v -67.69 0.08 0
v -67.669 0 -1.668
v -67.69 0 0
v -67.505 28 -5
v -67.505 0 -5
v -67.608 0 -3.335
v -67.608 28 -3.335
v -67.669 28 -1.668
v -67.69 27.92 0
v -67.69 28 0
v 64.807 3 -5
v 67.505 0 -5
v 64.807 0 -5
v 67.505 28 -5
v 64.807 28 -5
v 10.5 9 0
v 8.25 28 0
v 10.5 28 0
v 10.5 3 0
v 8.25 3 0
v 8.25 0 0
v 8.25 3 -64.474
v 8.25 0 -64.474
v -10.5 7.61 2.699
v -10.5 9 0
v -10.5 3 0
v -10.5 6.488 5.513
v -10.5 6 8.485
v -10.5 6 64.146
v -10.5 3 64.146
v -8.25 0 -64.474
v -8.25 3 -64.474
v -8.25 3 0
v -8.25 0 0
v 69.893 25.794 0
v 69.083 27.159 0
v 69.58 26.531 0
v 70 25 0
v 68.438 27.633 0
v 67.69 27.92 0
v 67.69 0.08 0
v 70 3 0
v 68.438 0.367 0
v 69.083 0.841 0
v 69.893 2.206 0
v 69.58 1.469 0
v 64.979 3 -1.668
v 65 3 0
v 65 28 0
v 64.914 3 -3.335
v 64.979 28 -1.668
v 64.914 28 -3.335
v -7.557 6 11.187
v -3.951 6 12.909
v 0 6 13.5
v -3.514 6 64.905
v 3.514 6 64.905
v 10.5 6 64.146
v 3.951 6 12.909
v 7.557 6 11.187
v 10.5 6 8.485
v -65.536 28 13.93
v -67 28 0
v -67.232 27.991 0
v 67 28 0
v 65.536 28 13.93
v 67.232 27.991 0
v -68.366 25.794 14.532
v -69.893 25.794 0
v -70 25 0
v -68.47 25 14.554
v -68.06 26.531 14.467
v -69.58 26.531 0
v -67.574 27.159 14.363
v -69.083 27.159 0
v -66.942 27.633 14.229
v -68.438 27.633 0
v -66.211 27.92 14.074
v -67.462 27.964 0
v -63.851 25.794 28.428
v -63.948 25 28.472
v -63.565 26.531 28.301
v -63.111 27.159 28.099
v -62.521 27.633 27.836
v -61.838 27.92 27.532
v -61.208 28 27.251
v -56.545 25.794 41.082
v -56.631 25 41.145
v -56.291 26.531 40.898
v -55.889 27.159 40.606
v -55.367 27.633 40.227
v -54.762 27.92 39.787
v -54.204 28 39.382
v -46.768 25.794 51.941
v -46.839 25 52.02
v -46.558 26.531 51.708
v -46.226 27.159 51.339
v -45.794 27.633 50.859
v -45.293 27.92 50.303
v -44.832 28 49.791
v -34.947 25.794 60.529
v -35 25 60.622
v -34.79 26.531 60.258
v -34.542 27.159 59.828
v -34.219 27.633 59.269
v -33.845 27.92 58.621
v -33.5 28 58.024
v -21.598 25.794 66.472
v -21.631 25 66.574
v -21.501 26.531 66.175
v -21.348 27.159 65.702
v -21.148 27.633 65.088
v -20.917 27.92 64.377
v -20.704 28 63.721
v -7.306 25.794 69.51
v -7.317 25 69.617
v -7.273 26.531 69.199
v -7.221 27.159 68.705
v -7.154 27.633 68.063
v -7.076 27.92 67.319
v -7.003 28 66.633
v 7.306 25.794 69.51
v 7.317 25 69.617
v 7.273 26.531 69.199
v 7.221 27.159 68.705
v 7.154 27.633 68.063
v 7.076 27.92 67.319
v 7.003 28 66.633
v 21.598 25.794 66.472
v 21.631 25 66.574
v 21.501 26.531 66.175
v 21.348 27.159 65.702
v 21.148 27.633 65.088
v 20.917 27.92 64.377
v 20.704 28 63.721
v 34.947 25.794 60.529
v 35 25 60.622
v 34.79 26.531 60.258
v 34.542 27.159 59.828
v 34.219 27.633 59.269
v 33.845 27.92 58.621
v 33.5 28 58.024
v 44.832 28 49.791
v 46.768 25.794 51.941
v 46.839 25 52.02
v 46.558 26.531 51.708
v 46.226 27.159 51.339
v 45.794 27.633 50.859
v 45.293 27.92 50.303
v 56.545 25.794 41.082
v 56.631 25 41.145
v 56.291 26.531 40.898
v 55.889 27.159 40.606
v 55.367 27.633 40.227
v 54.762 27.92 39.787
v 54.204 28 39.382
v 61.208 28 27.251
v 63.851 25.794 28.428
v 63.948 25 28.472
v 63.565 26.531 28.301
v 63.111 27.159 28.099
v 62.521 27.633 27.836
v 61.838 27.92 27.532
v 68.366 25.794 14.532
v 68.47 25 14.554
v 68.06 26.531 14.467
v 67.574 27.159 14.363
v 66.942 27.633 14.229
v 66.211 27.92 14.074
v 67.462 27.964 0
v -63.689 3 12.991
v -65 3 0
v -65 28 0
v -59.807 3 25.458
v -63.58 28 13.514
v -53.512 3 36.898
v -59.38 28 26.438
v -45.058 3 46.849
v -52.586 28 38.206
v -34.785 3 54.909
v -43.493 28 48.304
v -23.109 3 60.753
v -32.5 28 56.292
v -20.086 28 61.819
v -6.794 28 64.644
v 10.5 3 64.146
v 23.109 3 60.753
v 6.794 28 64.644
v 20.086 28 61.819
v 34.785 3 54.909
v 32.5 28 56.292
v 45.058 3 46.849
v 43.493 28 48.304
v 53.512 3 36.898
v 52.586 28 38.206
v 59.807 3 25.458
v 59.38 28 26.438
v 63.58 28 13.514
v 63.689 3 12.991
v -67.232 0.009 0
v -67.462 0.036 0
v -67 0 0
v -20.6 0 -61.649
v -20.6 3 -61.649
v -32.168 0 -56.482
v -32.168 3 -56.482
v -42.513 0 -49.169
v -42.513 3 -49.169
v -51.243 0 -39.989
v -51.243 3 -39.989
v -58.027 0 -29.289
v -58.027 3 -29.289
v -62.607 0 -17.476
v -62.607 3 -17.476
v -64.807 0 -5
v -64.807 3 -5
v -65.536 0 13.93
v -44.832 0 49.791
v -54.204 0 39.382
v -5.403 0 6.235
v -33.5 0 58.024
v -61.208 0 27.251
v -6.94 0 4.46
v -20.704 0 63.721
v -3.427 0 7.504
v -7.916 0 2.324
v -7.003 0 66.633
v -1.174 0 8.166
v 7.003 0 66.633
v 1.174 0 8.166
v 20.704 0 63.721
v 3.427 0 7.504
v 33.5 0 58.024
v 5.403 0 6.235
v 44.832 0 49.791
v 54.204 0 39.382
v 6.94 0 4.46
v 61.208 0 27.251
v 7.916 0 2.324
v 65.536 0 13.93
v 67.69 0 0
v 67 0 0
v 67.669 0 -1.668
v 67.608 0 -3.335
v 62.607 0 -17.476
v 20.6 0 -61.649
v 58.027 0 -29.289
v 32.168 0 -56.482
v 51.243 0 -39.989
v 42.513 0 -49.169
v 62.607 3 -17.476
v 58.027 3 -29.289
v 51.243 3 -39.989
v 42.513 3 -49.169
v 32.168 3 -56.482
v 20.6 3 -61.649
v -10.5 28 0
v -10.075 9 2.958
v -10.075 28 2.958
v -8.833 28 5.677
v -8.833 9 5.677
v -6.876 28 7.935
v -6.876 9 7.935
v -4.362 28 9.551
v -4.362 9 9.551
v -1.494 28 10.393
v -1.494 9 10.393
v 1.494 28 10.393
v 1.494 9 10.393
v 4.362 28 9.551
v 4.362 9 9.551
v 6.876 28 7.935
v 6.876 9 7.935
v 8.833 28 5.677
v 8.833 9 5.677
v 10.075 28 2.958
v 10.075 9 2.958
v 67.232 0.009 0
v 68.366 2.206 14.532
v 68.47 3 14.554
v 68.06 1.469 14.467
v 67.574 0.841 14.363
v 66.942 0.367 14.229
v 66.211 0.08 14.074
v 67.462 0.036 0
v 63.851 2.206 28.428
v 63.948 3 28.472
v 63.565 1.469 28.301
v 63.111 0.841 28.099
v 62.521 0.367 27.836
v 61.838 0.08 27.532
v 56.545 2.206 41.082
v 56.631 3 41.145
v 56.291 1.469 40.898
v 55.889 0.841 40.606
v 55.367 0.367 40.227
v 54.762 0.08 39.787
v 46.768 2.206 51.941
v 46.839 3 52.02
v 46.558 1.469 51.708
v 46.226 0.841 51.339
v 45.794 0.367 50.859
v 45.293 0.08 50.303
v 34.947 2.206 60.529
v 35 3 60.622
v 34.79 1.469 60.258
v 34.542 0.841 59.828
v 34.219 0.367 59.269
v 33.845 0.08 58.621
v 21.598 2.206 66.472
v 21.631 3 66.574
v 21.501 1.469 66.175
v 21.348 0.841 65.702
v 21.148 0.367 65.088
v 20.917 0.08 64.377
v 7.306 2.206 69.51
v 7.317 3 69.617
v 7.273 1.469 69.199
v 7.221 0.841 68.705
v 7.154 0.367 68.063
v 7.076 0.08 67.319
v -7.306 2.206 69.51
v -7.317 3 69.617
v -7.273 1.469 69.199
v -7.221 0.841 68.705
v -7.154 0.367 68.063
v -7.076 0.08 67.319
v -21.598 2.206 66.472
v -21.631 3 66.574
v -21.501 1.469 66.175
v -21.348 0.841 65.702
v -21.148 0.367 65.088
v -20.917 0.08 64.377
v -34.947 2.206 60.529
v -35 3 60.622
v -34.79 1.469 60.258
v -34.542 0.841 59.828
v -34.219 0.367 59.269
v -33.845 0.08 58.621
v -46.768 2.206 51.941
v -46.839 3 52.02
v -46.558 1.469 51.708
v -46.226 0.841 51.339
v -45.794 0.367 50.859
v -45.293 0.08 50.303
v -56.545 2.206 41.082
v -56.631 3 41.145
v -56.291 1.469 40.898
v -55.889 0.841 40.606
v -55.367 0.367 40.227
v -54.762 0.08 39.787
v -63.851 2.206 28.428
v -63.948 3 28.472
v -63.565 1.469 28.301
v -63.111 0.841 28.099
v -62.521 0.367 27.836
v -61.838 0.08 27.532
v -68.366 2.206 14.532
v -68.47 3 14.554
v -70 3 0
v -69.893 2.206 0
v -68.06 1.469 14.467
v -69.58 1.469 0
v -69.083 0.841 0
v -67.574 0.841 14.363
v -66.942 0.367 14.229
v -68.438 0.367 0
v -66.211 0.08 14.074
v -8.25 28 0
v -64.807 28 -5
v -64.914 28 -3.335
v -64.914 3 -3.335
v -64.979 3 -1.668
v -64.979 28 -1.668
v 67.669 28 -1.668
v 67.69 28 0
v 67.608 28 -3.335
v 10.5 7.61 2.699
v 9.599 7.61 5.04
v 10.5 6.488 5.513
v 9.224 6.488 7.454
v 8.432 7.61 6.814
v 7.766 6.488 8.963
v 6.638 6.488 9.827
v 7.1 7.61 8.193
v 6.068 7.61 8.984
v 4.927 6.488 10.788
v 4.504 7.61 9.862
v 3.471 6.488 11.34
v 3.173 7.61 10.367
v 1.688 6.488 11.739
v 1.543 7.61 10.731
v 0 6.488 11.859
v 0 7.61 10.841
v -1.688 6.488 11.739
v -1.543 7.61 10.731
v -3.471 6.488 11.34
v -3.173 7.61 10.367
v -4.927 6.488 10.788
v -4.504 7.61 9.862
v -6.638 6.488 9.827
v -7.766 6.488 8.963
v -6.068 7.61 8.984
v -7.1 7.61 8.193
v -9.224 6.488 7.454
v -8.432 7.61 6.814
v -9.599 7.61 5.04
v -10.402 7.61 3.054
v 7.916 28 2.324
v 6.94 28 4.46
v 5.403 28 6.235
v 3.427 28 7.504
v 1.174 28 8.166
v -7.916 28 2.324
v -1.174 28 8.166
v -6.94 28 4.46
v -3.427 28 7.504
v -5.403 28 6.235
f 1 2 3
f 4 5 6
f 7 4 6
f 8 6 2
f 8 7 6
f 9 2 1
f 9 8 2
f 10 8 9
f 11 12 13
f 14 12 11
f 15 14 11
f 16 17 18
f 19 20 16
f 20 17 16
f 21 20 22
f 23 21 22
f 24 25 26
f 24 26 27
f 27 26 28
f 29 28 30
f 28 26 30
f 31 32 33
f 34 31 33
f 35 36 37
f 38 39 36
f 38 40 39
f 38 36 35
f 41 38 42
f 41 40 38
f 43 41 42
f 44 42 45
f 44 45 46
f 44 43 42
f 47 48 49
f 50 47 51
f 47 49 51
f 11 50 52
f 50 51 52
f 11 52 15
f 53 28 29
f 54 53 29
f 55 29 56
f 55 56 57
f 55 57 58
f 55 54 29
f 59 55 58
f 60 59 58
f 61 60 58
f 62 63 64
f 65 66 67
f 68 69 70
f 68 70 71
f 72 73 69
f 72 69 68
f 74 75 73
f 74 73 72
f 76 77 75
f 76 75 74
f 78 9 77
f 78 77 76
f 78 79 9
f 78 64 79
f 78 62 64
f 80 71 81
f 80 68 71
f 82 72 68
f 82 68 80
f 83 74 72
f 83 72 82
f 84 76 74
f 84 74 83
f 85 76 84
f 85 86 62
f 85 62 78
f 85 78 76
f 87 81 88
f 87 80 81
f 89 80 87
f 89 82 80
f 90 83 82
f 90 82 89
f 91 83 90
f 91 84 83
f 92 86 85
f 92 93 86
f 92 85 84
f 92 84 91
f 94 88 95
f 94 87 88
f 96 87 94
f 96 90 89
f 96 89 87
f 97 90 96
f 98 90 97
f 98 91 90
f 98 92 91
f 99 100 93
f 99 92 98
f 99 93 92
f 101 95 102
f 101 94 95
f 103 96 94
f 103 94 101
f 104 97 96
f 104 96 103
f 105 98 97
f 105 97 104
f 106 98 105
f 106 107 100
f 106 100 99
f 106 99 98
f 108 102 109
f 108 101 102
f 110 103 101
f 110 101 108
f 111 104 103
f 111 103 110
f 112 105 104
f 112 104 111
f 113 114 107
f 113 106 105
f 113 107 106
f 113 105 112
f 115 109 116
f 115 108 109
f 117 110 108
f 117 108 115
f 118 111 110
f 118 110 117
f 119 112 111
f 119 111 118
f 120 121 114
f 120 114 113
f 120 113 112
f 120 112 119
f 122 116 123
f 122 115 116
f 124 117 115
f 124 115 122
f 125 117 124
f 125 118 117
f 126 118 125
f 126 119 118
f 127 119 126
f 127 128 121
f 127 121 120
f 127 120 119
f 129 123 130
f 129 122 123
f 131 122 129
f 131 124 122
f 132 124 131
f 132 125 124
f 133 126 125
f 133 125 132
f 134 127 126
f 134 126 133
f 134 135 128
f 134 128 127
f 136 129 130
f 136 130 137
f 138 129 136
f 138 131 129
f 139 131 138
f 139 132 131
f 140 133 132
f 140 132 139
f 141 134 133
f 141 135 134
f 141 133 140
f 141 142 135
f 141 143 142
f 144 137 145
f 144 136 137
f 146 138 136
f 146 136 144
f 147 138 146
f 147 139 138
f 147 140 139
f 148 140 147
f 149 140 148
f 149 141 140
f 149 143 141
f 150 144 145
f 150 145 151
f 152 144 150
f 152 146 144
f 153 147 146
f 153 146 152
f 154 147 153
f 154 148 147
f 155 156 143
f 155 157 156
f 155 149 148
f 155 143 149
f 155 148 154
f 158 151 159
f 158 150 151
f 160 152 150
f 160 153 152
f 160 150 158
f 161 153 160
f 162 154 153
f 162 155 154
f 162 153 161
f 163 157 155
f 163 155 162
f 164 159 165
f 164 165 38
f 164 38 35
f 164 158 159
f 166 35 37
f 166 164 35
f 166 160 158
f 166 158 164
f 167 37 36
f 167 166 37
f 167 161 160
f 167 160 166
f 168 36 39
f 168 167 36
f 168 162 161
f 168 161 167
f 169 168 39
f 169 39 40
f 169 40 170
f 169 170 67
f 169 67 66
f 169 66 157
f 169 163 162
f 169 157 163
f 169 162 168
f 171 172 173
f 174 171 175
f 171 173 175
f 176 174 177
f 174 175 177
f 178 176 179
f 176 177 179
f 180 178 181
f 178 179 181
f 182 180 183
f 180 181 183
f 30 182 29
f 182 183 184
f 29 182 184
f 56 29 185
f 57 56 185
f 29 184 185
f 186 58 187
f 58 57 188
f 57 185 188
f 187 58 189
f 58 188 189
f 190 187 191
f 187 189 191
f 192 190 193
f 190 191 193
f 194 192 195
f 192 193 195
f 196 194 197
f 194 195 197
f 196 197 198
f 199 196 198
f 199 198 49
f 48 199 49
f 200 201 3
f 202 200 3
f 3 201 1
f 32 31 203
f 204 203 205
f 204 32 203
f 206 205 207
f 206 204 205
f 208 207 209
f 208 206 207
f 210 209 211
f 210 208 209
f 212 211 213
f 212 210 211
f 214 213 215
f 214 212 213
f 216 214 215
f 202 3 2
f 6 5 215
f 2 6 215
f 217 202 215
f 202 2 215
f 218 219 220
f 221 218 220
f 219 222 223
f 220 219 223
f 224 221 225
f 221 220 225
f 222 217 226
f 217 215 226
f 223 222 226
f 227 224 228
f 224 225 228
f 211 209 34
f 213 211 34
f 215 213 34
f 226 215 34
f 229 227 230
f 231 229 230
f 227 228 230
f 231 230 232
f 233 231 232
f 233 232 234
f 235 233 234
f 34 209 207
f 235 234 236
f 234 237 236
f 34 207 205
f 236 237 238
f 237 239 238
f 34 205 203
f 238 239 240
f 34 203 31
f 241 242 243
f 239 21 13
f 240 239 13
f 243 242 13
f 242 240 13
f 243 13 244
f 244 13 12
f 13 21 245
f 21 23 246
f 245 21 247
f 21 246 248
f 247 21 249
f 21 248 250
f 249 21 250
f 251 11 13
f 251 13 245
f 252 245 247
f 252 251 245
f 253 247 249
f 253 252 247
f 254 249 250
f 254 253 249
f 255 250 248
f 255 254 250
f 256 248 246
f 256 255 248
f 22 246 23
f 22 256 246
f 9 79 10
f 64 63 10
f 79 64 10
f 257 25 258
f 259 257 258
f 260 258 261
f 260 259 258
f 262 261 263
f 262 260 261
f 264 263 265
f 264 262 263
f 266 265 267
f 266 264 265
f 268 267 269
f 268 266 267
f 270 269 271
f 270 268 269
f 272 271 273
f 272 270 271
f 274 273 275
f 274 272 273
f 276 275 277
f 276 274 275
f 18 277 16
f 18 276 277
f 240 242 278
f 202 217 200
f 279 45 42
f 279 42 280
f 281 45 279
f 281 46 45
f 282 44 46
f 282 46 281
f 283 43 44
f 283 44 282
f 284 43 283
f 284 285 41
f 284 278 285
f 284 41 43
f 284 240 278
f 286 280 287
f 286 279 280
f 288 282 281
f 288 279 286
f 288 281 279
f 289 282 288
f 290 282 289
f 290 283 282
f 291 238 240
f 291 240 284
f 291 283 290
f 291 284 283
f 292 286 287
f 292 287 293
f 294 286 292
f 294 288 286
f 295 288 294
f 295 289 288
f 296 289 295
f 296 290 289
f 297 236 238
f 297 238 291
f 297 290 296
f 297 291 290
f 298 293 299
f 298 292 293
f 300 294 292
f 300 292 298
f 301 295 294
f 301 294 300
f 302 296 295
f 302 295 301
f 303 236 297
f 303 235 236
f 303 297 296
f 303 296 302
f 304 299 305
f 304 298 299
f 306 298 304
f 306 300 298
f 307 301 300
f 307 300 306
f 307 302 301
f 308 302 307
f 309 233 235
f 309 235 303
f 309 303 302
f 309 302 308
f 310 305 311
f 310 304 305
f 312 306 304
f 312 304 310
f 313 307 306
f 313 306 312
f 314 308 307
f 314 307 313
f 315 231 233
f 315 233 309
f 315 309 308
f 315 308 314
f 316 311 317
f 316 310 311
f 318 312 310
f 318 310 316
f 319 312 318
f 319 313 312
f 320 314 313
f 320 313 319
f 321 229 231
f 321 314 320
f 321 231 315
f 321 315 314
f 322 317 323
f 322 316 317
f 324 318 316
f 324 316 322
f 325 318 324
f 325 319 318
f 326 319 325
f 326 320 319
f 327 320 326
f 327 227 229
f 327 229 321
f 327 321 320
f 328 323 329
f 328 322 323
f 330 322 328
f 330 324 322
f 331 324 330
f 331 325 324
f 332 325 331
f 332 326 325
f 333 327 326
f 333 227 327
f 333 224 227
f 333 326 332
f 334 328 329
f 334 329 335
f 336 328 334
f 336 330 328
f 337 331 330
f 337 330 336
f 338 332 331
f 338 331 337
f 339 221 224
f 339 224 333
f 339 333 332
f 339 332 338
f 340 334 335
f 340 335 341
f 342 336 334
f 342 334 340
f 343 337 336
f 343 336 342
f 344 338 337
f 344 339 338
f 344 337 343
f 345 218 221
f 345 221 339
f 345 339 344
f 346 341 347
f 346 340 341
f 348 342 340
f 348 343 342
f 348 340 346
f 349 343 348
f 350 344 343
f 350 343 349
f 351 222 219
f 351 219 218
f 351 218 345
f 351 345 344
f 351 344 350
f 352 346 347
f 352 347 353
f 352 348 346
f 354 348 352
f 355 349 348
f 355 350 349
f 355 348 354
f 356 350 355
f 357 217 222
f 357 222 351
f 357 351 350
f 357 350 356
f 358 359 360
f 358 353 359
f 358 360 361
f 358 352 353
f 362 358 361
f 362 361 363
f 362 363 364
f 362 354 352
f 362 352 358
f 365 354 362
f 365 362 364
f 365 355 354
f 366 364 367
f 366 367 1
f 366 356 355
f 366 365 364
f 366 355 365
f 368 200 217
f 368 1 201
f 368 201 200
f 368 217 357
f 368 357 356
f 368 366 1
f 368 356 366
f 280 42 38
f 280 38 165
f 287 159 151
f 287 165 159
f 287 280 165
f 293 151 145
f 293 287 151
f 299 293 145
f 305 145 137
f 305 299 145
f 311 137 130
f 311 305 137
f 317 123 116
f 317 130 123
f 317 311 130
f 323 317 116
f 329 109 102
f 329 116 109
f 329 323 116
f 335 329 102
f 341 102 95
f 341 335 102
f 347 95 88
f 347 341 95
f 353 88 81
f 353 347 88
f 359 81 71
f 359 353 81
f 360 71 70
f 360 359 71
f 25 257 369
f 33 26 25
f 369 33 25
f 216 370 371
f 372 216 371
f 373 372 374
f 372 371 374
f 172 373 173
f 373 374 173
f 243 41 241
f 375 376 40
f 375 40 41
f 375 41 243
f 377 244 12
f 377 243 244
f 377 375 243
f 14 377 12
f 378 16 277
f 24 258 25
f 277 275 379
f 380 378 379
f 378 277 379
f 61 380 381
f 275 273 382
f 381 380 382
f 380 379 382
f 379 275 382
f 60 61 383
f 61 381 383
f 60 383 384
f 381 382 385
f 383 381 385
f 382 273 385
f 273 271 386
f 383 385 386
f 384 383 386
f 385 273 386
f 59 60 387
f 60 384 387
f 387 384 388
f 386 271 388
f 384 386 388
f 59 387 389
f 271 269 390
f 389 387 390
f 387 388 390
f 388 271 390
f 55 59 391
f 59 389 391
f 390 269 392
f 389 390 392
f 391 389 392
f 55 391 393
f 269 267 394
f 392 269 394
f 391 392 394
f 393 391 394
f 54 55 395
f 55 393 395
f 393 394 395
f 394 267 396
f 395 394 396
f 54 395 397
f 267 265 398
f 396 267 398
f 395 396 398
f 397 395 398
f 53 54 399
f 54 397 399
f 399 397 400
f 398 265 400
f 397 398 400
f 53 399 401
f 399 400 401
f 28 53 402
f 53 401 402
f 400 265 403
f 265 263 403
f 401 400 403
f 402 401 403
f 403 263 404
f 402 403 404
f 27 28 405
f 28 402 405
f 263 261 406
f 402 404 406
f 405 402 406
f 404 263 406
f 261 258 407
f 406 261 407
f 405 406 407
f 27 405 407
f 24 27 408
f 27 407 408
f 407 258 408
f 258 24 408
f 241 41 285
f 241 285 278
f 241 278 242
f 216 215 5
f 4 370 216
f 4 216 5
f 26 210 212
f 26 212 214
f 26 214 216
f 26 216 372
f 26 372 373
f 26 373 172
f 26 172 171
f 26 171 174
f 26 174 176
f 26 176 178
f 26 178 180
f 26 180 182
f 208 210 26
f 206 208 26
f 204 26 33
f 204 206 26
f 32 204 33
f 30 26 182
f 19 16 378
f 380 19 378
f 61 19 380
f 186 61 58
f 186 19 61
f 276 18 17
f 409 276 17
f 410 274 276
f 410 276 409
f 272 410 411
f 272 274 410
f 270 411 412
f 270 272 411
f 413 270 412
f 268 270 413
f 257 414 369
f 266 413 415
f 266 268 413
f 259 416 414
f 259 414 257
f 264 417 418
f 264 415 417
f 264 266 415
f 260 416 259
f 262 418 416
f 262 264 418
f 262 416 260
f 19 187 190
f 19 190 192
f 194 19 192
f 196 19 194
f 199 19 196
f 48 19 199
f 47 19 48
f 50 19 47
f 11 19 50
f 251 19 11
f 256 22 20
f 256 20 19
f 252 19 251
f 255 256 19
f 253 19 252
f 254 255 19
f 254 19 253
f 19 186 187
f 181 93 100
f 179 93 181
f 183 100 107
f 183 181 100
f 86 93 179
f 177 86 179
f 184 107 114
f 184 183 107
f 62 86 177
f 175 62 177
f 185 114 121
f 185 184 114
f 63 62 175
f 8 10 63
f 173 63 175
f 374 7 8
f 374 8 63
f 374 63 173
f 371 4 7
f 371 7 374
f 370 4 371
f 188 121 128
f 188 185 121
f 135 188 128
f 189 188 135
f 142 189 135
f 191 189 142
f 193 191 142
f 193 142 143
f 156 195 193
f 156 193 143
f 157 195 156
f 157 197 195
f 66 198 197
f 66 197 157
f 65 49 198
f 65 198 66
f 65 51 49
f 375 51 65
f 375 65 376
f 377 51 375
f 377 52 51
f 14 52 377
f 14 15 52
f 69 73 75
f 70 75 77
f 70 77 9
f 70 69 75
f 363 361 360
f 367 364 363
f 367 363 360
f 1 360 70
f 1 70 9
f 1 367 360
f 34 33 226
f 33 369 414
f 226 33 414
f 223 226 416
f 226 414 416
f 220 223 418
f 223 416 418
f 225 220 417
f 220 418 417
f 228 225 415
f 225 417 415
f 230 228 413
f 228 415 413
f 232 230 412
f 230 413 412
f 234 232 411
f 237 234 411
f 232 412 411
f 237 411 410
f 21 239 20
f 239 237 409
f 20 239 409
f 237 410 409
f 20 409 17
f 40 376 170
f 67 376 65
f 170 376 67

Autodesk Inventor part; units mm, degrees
ref_plane "YZ Plane" through (0, 0, 0) normal (1, 0, 0) x (0, 1, 0)
ref_plane "XZ Plane" through (0, 0, 0) normal (0, 1, 0) x (-1, 0, 0)
ref_plane "XY Plane" through (0, 0, 0) normal (0, 0, 1) x (1, 0, 0)
sketch "Sketch1" plane through (0, 0, 0) normal (0, 1, 0) x (-1, 0, 0)
  circle A0 centre (0, 0) radius 70
  dimension "d0" = 140
extrude "Extrusion1" add sketch "Sketch1" along normal blind 28
sketch "Sketch2" plane through (0, 28, 0) normal (0, 1, 0) x (1, 0, 0)
  circle A0 centre (0, 0) radius 8.25
  dimension "d3" = 16.5
extrude "Extrusion2" cut sketch "Sketch2" against normal blind 28
sketch "Sketch3" plane through (0, 28, 0) normal (0, 1, 0) x (1, 0, 0)
  circle A0 centre (0, 0) radius 8.25
  circle A1 centre (0, 0) radius 65
  circle A2 centre (0, 0) radius 10.5
  dimension "d6" = 130
  dimension "d7" = 21
extrude "Extrusion3" cut sketch "Sketch3" against normal blind 25 contours A1
sketch "Sketch4" plane through (0, 3, 0) normal (0, 1, 0) x (1, 0, 0)
  line L0 (-77.4845, 0) -> (88.5537, 0)
  line L1 (88.5537, 0) -> (88.5537, 100.8261)
  line L2 (88.5537, 100.8261) -> (-77.4845, 100.8261)
  line L3 (-77.4845, 100.8261) -> (-77.4845, 0)
  point P0 (0, 0)
  point P1 (0, 0)
extrude "Extrusion4" cut sketch "Sketch4" along normal blind 220
sketch "Sketch5" plane through (0, 3, 0) normal (0, 1, 0) x (1, 0, 0)
  arc A0 (-10.5, 0) -> (10.5, 0) centre (0, 0) ccw projected
  arc A1 (-65, 0) -> (65, 0) centre (0, 0) ccw projected
  arc A2 (-10.5, 0) -> (10.5, 0) centre (0, 0) ccw projected
  line L0 (10.5, 0) -> (10.5, -64.1463)
  line L1 (-10.5, 0) -> (-10.5, -64.1463)
  arc A3 (-10.5, -64.1463) -> (10.5, -64.1463) centre (0, 0) ccw
  arc A4 (-10.5, 0) -> (10.5, 0) centre (0, 0) ccw
extrude "Extrusion5" add sketch "Sketch5" along normal blind 3
sketch "Sketch6" plane through (0, 28, 0) normal (0, 1, 0) x (1, 0, 0)
  line L0 (-8.25, 0) -> (-10.5, 0) projected
  line L1 (-8.25, 0) -> (8.25, 0)
  line L2 (8.25, 0) -> (8.25, 75.2128)
  line L3 (8.25, 75.2128) -> (-8.25, 75.2128)
  line L4 (-8.25, 75.2128) -> (-8.25, 0)
  point P0 (0, 0)
  dimension "d14" = 16.5
extrude "Extrusion6" cut sketch "Sketch6" against normal blind 30
sketch "Sketch8" plane through (0, 3, 0) normal (0, 1, 0) x (1, 0, 0)
  arc A0 (-65, 0) -> (65, 0) centre (0, 0) ccw
  line L0 (65, 0) -> (70, 0)
  arc A1 (70, 0) -> (-70, 0) centre (0, 0) ccw
  line L1 (-70, 0) -> (-65, 0)
  arc A2 (-10.5, 0) -> (10.5, 0) centre (0, 0) ccw
  line L2 (-10.5, 0) -> (-8.25, 0)
  arc A3 (8.25, 0) -> (-8.25, 0) centre (0, 0) ccw
  line L3 (8.25, 0) -> (10.5, 0)
  circle A4 centre (0, 0) radius 8.25
  arc A5 (65, 0) -> (-65, 0) centre (0, 0) ccw
  line L4 (-65, 0) -> (-70, 0)
  line L5 (65, 0) -> (70, 0)
  arc A6 (70, 0) -> (-70, 0) centre (0, 0) ccw
  arc A7 (70, 0) -> (70, 0) centre (0, 0) ccw
extrude "Extrusion7" cut sketch "Sketch8" against normal blind 30 contours L1 A1 L0 A5
fillet "Fillet1" radius 3 1 edges at (0, 6, 10.5)
fillet "Fillet2" radius 3 1 edges at (0, 0, 70)
fillet "Fillet4" radius 3 1 edges at (0, 28, 70)
sketch "Sketch11" plane through (0, 28, 0) normal (0, 1, 0) x (1, 0, 0)
  line L0 (-65, 0) -> (-67.69, 0)
  line L1 (-64.8074, 5) -> (-67.4974, 5)
  arc A0 (-67.5051, 5) -> (-67.69, 0) centre (0, 0) ccw
  arc A1 (-64.8074, 5) -> (-65, 0) centre (0, 0) ccw
  line L2 (-65, 0) -> (-67.69, 0)
  line L3 (-70, 0) -> (-67, 0) projected
  line L4 (-64.8074, 5) -> (-67.5051, 5)
  dimension "d30" = 2.69
  dimension "d32" = 2.69
extrude "Extrusion10" add sketch "Sketch11" against normal blind 28
mirror "Mirror3" about plane through (0, 0, 0) normal (1, 0, 0) of "Extrusion10"
properties part number "casept2"
